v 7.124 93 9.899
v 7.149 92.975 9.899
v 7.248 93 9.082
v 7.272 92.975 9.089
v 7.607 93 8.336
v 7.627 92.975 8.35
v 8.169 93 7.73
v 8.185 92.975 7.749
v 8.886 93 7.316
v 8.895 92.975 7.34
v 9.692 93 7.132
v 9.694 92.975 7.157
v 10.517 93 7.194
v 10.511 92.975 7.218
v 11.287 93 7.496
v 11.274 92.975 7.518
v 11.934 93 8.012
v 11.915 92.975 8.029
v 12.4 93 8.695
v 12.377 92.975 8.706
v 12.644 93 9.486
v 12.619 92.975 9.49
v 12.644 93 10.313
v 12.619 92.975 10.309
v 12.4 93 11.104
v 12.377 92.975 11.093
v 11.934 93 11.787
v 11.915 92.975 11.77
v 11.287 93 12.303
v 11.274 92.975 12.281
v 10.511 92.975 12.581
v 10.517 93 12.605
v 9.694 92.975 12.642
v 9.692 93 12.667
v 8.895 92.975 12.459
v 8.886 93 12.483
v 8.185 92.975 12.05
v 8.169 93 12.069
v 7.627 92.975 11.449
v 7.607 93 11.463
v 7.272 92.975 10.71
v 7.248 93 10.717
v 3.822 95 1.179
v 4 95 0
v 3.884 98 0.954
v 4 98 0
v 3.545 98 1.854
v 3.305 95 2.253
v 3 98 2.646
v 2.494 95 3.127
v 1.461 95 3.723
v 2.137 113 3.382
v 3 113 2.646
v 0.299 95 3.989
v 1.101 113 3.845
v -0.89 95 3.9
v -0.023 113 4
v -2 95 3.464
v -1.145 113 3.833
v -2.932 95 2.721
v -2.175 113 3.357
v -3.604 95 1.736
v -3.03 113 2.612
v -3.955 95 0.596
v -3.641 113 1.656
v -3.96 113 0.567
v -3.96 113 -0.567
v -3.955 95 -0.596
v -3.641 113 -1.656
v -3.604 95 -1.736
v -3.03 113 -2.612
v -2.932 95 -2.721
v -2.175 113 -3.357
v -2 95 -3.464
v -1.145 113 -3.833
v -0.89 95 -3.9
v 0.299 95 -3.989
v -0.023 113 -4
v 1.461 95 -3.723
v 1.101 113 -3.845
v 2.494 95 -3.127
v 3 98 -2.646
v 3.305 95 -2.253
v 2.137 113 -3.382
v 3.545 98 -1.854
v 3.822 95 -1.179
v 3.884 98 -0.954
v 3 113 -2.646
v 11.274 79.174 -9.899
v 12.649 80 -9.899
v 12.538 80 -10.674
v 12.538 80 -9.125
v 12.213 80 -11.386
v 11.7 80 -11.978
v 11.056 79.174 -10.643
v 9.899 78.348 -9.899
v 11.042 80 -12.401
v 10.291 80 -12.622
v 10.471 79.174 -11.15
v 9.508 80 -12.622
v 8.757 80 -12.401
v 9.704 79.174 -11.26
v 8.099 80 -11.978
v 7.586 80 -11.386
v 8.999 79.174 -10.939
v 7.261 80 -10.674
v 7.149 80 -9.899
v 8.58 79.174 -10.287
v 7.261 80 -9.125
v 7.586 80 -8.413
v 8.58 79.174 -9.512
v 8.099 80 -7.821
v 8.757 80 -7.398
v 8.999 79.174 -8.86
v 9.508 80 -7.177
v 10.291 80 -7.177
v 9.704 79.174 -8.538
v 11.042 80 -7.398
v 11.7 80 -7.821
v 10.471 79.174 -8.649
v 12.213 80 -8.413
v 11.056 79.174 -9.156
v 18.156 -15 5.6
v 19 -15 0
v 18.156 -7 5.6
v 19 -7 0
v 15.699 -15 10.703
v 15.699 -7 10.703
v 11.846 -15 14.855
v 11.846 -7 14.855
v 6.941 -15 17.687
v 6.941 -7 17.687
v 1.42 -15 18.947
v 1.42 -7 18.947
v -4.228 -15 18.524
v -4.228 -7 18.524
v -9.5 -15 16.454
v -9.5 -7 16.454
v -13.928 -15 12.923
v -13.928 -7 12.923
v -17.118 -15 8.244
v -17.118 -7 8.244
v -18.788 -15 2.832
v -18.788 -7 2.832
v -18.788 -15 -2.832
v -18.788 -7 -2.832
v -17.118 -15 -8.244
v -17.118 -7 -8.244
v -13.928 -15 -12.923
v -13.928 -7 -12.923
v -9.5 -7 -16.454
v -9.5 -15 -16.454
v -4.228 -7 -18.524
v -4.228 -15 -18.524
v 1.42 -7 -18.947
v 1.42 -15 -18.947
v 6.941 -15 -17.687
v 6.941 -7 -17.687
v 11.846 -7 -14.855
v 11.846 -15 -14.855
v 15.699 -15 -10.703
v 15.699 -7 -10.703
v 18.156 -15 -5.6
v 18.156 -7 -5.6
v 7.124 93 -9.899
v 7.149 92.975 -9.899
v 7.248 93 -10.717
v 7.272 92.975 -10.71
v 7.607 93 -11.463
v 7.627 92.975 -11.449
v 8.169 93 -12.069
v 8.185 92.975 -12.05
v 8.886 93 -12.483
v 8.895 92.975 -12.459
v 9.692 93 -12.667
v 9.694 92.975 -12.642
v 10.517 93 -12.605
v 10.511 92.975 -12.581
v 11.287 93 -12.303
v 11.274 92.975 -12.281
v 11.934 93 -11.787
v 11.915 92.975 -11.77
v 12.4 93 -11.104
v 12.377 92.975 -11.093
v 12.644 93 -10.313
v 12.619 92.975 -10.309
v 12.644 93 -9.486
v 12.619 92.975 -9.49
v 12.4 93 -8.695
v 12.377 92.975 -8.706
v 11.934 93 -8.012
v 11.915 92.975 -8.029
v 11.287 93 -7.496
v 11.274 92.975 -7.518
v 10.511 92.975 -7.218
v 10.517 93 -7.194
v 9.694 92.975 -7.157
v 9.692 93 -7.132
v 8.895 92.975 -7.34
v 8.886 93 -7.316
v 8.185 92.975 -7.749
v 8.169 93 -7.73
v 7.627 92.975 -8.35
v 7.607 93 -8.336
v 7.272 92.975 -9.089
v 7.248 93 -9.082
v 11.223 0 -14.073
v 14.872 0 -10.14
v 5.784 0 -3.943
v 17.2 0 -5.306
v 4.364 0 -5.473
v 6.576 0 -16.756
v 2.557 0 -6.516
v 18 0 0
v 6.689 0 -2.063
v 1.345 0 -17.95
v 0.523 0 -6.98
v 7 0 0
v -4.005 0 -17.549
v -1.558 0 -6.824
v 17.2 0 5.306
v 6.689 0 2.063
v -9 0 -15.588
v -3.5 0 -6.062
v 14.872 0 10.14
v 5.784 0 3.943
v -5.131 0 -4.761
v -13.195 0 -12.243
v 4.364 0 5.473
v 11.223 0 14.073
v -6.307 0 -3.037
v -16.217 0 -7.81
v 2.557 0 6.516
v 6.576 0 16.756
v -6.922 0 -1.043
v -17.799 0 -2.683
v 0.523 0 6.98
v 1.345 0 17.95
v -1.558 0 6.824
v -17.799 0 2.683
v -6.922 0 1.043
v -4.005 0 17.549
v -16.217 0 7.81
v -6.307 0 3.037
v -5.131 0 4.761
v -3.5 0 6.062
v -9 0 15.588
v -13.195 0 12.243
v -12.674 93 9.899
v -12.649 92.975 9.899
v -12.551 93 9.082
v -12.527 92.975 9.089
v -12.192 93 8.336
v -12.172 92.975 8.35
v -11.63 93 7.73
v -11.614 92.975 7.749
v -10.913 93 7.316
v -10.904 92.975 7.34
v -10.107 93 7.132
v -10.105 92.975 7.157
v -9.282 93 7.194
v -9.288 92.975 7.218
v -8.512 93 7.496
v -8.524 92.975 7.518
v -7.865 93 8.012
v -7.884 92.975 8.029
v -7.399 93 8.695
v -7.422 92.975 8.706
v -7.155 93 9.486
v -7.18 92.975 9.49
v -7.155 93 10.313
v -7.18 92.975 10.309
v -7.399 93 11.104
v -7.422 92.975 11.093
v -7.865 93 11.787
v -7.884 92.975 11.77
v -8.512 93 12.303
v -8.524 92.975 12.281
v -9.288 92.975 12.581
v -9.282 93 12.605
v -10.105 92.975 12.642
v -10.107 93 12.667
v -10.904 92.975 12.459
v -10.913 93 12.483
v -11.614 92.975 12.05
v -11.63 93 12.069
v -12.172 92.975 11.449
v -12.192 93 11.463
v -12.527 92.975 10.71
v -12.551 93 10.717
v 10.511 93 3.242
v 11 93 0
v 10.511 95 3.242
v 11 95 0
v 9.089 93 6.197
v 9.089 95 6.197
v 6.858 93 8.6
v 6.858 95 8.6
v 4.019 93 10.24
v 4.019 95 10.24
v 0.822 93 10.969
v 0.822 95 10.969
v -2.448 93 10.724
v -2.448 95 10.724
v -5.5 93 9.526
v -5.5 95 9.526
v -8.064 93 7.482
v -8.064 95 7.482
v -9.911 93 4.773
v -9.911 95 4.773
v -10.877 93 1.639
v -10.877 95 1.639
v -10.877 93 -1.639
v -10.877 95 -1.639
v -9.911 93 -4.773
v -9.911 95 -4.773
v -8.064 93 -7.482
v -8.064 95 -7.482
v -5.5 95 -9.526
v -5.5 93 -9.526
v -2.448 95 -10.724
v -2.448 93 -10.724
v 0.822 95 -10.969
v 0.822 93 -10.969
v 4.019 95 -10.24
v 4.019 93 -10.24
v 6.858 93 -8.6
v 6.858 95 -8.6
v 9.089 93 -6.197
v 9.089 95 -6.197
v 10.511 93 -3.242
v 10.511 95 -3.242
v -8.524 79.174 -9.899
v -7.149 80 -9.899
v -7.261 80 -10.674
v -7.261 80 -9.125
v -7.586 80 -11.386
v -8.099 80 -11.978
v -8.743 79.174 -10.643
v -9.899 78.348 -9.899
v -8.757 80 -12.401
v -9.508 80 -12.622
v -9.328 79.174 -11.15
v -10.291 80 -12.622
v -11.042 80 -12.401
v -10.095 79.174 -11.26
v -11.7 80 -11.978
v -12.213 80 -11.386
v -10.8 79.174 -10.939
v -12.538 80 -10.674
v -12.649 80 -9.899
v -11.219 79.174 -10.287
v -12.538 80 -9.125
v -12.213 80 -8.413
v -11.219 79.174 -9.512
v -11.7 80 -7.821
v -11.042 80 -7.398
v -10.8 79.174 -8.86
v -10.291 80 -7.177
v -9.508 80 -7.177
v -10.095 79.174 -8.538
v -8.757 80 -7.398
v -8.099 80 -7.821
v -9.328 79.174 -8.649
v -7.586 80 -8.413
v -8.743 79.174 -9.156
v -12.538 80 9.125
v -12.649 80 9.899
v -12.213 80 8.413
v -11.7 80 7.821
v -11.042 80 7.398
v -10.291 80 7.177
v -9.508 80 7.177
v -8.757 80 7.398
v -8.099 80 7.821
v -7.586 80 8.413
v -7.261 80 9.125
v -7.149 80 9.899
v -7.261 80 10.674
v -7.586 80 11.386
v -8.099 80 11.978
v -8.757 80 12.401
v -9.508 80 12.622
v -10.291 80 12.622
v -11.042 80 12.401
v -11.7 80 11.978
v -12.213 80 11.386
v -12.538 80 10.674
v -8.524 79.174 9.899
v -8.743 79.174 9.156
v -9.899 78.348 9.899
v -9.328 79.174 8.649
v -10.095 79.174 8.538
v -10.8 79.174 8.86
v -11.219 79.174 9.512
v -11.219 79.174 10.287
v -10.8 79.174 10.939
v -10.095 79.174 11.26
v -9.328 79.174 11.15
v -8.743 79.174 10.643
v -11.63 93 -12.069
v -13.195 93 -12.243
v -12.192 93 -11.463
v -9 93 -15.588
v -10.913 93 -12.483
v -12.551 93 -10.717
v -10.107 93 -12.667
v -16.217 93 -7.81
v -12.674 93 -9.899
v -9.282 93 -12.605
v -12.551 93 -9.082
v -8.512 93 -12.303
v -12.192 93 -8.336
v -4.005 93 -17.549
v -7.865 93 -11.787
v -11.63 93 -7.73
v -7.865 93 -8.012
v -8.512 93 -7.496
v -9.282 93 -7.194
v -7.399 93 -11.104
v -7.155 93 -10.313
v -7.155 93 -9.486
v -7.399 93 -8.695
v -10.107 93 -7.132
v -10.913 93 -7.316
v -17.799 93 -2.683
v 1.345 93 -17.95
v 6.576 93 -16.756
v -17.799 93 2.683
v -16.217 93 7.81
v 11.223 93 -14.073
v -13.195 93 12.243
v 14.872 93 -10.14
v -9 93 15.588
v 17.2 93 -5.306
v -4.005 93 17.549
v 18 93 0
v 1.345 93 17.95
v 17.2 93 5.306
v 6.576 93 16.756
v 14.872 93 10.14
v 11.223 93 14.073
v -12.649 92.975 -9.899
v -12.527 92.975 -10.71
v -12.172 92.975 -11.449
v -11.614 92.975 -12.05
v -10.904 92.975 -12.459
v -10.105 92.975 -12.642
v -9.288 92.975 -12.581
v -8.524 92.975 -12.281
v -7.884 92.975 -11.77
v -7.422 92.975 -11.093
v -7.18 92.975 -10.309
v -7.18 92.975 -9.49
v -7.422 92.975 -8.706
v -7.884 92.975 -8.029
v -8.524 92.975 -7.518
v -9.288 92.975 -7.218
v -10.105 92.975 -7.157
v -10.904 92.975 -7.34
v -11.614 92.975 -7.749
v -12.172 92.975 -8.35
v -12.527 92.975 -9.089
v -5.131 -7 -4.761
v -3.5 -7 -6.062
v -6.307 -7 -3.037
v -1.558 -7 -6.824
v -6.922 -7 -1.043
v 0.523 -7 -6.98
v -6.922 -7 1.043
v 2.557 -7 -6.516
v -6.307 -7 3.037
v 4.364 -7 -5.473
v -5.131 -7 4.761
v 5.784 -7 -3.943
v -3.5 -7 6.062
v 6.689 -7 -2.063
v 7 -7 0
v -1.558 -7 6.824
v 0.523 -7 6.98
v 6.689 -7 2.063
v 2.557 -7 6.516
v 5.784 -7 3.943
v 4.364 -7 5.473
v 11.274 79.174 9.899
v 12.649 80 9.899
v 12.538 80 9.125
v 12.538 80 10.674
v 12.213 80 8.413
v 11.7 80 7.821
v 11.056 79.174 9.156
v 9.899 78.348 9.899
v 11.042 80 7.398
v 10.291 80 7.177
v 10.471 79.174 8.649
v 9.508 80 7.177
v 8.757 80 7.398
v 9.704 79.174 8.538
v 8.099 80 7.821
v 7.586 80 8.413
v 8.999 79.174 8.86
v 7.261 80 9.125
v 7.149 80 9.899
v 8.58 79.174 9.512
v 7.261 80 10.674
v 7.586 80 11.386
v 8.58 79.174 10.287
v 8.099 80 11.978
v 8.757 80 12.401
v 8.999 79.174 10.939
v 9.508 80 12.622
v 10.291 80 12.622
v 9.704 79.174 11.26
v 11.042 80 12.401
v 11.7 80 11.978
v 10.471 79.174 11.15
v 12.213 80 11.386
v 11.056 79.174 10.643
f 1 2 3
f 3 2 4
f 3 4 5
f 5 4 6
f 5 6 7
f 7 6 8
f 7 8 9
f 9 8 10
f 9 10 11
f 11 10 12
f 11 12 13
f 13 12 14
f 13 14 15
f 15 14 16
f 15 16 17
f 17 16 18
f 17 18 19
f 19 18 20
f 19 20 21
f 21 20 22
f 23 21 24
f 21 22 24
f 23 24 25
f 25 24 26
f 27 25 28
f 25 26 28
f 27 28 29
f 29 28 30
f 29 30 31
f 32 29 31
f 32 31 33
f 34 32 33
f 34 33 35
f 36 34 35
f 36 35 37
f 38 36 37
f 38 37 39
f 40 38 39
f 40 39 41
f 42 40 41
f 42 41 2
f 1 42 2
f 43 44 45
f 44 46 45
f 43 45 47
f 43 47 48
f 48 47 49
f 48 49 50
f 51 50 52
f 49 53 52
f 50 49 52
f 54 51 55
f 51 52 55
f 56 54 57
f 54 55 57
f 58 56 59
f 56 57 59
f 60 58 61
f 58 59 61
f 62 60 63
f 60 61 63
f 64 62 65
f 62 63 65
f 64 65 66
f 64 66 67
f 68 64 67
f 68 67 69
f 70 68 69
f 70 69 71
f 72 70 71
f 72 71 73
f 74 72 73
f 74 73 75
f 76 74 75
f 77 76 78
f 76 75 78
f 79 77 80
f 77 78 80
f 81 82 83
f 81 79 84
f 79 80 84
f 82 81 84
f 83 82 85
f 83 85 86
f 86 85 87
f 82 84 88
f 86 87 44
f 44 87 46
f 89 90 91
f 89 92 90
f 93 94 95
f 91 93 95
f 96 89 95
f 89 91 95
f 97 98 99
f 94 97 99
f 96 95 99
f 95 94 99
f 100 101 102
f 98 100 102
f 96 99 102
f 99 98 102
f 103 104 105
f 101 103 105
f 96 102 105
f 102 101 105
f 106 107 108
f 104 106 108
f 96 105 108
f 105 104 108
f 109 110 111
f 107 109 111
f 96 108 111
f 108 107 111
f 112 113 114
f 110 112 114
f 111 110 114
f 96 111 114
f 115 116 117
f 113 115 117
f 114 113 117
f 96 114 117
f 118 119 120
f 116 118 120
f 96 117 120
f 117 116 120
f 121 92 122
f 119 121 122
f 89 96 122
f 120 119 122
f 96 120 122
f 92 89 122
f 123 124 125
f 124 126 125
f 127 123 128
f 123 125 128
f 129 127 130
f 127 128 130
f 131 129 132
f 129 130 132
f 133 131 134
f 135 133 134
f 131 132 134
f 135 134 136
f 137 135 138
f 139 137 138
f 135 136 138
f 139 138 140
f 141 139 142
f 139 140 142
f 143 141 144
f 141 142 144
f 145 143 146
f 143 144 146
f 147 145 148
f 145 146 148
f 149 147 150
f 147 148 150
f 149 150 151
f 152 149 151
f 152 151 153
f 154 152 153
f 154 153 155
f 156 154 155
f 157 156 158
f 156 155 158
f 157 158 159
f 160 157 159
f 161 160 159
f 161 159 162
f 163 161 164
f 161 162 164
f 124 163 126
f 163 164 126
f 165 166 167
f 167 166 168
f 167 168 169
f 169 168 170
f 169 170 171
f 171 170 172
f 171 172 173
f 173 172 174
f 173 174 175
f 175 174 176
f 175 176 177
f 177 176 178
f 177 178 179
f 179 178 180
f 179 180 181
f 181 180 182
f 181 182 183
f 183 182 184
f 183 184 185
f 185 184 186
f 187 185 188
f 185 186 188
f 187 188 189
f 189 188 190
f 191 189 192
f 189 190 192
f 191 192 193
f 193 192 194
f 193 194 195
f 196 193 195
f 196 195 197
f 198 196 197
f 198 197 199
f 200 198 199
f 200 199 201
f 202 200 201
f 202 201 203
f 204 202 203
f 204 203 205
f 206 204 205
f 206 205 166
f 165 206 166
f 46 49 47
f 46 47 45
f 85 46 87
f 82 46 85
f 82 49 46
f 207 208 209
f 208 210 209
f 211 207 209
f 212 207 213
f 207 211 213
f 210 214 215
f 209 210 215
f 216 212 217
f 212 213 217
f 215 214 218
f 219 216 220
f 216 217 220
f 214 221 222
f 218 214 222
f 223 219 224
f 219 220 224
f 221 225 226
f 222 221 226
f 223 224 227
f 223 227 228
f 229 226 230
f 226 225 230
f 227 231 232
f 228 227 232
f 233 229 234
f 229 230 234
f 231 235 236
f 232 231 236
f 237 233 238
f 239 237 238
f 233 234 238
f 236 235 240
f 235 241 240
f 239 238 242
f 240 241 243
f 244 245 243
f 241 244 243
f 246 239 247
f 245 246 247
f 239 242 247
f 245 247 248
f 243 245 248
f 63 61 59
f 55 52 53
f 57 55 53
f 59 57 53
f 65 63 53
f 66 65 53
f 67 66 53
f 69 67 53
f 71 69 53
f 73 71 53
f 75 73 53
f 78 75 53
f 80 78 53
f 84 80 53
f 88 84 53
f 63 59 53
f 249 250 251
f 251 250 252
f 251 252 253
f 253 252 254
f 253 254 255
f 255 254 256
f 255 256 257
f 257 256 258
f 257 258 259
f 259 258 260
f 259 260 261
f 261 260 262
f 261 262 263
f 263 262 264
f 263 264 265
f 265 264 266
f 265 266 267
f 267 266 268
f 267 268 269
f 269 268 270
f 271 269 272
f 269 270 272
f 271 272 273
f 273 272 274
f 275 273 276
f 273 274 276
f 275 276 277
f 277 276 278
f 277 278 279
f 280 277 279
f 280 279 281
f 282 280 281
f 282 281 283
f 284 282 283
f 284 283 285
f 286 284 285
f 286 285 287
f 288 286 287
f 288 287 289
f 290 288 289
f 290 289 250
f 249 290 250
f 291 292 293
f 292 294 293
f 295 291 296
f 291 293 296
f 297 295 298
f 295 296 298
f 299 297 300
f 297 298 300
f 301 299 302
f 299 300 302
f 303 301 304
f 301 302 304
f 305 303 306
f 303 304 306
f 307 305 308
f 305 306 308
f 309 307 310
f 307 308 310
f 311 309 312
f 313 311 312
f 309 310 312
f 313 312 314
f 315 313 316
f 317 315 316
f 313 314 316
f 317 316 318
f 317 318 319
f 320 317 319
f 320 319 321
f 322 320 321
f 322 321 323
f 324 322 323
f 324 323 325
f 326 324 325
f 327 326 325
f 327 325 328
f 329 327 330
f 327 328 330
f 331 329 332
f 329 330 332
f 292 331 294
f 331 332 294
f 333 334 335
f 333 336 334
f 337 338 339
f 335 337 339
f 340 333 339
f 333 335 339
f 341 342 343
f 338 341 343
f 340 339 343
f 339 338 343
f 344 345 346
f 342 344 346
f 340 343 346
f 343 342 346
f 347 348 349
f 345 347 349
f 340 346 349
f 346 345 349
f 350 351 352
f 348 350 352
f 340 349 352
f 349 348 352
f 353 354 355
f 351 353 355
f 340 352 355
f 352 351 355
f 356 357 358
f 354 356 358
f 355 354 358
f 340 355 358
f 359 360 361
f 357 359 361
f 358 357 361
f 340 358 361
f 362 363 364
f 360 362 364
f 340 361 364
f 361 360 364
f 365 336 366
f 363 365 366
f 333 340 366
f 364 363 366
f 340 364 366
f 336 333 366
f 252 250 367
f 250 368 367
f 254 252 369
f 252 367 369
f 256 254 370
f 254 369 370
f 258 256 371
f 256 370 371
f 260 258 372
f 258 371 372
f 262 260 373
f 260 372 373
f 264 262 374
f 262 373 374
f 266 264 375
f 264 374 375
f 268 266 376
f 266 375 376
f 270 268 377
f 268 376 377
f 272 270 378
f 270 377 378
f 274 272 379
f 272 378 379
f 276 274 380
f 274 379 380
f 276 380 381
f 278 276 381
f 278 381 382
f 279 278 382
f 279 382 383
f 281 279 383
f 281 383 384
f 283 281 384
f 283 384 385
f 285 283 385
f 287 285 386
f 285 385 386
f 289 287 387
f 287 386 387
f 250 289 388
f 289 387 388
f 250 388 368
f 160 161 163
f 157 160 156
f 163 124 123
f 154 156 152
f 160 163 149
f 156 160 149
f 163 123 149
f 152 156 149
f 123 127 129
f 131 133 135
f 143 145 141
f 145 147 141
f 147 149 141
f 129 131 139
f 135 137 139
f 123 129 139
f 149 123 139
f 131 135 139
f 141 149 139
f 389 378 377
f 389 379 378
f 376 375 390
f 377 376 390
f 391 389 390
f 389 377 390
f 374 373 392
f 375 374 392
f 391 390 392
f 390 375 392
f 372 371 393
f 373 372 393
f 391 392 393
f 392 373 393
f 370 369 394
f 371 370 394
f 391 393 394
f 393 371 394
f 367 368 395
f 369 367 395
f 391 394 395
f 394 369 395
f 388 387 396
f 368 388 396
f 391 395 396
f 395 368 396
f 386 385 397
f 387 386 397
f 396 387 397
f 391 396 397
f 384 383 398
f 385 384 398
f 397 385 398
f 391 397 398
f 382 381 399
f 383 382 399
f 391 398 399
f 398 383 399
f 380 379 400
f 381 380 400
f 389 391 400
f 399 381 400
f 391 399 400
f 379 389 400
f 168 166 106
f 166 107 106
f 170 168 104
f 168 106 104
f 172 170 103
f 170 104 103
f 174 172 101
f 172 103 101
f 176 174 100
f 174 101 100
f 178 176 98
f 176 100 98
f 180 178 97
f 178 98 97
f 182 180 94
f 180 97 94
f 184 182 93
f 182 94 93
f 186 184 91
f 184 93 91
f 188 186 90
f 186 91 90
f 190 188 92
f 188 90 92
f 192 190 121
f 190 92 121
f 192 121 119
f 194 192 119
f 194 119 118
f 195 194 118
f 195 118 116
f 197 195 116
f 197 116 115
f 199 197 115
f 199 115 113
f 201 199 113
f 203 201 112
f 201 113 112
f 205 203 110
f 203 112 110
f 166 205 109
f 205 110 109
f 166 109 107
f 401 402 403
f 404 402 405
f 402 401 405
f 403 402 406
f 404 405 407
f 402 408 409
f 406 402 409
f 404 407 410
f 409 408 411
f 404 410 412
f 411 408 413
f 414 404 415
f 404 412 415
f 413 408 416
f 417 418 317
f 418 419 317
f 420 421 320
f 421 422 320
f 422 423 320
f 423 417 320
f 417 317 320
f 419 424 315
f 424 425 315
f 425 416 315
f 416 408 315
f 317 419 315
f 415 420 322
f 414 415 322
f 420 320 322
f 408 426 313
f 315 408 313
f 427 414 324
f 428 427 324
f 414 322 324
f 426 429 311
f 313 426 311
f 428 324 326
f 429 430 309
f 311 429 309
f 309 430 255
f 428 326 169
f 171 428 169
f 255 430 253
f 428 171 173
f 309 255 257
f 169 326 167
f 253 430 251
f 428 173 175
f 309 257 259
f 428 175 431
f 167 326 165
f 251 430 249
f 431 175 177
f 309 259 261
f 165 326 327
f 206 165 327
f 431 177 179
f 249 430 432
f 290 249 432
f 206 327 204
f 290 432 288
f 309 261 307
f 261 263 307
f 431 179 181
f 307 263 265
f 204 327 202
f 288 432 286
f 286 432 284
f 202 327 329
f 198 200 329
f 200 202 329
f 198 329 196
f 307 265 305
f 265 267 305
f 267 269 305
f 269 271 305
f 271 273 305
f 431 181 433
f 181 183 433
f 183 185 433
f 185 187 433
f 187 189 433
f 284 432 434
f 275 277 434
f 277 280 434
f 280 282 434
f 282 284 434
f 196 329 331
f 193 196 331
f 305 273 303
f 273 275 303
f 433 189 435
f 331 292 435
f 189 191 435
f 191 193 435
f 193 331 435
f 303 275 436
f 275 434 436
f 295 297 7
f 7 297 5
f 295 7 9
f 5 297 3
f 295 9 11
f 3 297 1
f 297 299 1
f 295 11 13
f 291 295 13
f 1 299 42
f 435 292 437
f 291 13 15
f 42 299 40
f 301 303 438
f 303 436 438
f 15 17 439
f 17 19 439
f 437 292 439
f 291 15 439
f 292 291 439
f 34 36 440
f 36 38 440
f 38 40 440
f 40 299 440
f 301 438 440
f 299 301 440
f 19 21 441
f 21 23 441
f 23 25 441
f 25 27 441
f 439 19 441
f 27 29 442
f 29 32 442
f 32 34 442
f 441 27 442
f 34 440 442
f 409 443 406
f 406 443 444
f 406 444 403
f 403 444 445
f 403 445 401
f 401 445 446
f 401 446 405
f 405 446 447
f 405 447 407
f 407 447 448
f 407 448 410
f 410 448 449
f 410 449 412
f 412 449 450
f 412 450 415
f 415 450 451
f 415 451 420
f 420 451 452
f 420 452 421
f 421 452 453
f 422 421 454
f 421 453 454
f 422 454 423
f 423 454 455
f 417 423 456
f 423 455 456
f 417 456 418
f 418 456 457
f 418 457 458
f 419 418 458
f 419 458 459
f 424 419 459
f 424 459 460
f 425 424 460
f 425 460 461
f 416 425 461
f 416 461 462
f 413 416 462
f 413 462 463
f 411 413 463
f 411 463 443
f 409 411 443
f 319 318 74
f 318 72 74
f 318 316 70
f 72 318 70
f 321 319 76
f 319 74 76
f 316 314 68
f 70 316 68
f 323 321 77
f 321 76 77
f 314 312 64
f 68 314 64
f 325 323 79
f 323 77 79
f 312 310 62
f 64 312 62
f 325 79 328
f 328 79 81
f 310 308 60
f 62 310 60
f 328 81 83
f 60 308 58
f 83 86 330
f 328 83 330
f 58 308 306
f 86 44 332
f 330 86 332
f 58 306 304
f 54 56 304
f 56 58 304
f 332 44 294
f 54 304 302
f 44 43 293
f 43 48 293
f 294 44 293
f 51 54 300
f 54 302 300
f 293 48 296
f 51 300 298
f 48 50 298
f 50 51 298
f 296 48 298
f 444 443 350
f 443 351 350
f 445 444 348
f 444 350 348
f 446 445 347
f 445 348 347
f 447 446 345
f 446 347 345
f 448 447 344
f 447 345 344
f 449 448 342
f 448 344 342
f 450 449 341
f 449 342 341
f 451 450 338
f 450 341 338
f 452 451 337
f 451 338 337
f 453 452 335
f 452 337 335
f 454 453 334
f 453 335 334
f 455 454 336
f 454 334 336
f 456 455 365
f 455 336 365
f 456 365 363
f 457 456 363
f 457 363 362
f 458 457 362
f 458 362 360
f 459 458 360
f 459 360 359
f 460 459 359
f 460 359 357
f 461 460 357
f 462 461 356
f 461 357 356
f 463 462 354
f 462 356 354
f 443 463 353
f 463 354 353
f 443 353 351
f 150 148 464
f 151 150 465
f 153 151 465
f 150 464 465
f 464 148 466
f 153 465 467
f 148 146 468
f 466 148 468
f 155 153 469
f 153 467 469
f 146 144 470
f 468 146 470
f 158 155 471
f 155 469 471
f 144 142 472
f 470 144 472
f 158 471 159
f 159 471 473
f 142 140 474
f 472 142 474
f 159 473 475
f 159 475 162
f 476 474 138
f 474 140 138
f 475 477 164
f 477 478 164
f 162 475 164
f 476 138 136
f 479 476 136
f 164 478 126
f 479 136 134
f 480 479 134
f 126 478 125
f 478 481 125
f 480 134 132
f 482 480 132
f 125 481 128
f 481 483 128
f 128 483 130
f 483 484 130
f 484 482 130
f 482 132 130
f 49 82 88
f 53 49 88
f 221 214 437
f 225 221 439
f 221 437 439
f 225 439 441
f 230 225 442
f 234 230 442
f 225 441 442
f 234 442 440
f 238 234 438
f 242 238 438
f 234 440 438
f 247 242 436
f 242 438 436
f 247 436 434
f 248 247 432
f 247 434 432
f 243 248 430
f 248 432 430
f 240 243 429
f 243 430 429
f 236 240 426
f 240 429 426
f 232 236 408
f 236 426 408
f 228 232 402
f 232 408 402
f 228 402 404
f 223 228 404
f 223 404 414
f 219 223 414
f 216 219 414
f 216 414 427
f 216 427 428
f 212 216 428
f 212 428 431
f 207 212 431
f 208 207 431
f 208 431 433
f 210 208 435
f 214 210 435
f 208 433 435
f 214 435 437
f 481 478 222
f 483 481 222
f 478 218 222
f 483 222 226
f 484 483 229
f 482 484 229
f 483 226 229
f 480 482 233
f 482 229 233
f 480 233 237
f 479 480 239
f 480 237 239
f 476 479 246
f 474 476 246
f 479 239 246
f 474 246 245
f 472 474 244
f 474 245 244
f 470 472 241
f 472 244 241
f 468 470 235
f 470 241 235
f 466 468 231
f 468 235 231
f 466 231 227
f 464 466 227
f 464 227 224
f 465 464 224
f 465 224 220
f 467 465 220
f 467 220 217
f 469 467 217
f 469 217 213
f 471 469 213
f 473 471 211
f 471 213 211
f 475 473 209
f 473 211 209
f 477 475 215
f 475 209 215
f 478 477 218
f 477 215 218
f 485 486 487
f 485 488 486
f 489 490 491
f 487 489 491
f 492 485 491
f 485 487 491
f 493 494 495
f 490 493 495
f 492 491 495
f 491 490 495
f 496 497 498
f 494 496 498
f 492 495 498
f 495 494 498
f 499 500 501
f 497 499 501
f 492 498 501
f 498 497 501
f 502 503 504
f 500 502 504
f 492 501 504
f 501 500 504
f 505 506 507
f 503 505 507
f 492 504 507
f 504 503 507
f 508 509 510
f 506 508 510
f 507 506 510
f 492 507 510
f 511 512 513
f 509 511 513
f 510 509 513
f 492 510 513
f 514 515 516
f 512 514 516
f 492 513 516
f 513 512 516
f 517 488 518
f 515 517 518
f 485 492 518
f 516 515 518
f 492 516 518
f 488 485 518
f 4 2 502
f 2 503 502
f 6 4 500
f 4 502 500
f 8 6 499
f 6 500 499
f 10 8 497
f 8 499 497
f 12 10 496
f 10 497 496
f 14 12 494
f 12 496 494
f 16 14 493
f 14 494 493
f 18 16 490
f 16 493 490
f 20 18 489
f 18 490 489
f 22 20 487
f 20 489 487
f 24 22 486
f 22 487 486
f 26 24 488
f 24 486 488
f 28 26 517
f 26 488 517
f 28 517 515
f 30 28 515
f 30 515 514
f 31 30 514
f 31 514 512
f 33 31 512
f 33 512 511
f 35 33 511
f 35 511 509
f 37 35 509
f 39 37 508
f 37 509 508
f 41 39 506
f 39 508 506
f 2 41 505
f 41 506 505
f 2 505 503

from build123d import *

# Parameters (mm, degrees)
SKETCH2_W                      = 1.704522774
SKETCH2_H                      = 15
CUT_EXTRUDE1_DEPTH             = 20
CUT_EXTRUDE1_DEPTH_BACK        = 20
M5_CLEARANCE_HOLE1_D           = 5.5
M5_CLEARANCE_HOLE1_DEPTH       = 13
M5_CLEARANCE_HOLE1_CSINK_D     = 5.55
M5_CLEARANCE_HOLE1_CSINK_ANGLE = 90
M5_CLEARANCE_HOLE1_TIP         = 1.652366702


with BuildPart() as part:
    # Sketch1 → Revolve1 (revolve)
    with BuildSketch(Plane.XY):
        Polygon((18, 93), (11, 93), (11, 95), (4, 95), (4, 113), (0, 113), (0, 0), (0, -15), (19, -15), (19, -7), (7, -7), (7, 0), (18, 0), (18, 57), align=None)
    revolve(axis=Axis((0, 113, 0), (0, -1, 0)))

    # Sketch2 → Cut-Extrude1 (cut, two sides)
    with BuildSketch(Plane.XY) as cut_extrude1_sk:
        with Locations((3.852261387, 105.5)):
            Rectangle(SKETCH2_W, SKETCH2_H)
    extrude(amount=CUT_EXTRUDE1_DEPTH, mode=Mode.SUBTRACT)
    extrude(cut_extrude1_sk.sketch, amount=-CUT_EXTRUDE1_DEPTH_BACK, mode=Mode.SUBTRACT)

    # M5 Clearance Hole1
    with Locations(Plane(origin=(0, 93, 0), x_dir=(1, 0, 0), z_dir=(0, 1, 0))):
        with Locations((-9.899494937, 9.899494937), (-9.899494937, -9.899494937), (9.899494937, -9.899494937), (9.899494937, 9.899494937)):
            CounterSinkHole(M5_CLEARANCE_HOLE1_D / 2, M5_CLEARANCE_HOLE1_CSINK_D / 2, depth=M5_CLEARANCE_HOLE1_DEPTH, counter_sink_angle=M5_CLEARANCE_HOLE1_CSINK_ANGLE)
            with Locations((0, 0, -(M5_CLEARANCE_HOLE1_DEPTH + M5_CLEARANCE_HOLE1_TIP / 2))):  # 118° drill point
                Cone(0, M5_CLEARANCE_HOLE1_D / 2, M5_CLEARANCE_HOLE1_TIP, mode=Mode.SUBTRACT)


solid = part.part
